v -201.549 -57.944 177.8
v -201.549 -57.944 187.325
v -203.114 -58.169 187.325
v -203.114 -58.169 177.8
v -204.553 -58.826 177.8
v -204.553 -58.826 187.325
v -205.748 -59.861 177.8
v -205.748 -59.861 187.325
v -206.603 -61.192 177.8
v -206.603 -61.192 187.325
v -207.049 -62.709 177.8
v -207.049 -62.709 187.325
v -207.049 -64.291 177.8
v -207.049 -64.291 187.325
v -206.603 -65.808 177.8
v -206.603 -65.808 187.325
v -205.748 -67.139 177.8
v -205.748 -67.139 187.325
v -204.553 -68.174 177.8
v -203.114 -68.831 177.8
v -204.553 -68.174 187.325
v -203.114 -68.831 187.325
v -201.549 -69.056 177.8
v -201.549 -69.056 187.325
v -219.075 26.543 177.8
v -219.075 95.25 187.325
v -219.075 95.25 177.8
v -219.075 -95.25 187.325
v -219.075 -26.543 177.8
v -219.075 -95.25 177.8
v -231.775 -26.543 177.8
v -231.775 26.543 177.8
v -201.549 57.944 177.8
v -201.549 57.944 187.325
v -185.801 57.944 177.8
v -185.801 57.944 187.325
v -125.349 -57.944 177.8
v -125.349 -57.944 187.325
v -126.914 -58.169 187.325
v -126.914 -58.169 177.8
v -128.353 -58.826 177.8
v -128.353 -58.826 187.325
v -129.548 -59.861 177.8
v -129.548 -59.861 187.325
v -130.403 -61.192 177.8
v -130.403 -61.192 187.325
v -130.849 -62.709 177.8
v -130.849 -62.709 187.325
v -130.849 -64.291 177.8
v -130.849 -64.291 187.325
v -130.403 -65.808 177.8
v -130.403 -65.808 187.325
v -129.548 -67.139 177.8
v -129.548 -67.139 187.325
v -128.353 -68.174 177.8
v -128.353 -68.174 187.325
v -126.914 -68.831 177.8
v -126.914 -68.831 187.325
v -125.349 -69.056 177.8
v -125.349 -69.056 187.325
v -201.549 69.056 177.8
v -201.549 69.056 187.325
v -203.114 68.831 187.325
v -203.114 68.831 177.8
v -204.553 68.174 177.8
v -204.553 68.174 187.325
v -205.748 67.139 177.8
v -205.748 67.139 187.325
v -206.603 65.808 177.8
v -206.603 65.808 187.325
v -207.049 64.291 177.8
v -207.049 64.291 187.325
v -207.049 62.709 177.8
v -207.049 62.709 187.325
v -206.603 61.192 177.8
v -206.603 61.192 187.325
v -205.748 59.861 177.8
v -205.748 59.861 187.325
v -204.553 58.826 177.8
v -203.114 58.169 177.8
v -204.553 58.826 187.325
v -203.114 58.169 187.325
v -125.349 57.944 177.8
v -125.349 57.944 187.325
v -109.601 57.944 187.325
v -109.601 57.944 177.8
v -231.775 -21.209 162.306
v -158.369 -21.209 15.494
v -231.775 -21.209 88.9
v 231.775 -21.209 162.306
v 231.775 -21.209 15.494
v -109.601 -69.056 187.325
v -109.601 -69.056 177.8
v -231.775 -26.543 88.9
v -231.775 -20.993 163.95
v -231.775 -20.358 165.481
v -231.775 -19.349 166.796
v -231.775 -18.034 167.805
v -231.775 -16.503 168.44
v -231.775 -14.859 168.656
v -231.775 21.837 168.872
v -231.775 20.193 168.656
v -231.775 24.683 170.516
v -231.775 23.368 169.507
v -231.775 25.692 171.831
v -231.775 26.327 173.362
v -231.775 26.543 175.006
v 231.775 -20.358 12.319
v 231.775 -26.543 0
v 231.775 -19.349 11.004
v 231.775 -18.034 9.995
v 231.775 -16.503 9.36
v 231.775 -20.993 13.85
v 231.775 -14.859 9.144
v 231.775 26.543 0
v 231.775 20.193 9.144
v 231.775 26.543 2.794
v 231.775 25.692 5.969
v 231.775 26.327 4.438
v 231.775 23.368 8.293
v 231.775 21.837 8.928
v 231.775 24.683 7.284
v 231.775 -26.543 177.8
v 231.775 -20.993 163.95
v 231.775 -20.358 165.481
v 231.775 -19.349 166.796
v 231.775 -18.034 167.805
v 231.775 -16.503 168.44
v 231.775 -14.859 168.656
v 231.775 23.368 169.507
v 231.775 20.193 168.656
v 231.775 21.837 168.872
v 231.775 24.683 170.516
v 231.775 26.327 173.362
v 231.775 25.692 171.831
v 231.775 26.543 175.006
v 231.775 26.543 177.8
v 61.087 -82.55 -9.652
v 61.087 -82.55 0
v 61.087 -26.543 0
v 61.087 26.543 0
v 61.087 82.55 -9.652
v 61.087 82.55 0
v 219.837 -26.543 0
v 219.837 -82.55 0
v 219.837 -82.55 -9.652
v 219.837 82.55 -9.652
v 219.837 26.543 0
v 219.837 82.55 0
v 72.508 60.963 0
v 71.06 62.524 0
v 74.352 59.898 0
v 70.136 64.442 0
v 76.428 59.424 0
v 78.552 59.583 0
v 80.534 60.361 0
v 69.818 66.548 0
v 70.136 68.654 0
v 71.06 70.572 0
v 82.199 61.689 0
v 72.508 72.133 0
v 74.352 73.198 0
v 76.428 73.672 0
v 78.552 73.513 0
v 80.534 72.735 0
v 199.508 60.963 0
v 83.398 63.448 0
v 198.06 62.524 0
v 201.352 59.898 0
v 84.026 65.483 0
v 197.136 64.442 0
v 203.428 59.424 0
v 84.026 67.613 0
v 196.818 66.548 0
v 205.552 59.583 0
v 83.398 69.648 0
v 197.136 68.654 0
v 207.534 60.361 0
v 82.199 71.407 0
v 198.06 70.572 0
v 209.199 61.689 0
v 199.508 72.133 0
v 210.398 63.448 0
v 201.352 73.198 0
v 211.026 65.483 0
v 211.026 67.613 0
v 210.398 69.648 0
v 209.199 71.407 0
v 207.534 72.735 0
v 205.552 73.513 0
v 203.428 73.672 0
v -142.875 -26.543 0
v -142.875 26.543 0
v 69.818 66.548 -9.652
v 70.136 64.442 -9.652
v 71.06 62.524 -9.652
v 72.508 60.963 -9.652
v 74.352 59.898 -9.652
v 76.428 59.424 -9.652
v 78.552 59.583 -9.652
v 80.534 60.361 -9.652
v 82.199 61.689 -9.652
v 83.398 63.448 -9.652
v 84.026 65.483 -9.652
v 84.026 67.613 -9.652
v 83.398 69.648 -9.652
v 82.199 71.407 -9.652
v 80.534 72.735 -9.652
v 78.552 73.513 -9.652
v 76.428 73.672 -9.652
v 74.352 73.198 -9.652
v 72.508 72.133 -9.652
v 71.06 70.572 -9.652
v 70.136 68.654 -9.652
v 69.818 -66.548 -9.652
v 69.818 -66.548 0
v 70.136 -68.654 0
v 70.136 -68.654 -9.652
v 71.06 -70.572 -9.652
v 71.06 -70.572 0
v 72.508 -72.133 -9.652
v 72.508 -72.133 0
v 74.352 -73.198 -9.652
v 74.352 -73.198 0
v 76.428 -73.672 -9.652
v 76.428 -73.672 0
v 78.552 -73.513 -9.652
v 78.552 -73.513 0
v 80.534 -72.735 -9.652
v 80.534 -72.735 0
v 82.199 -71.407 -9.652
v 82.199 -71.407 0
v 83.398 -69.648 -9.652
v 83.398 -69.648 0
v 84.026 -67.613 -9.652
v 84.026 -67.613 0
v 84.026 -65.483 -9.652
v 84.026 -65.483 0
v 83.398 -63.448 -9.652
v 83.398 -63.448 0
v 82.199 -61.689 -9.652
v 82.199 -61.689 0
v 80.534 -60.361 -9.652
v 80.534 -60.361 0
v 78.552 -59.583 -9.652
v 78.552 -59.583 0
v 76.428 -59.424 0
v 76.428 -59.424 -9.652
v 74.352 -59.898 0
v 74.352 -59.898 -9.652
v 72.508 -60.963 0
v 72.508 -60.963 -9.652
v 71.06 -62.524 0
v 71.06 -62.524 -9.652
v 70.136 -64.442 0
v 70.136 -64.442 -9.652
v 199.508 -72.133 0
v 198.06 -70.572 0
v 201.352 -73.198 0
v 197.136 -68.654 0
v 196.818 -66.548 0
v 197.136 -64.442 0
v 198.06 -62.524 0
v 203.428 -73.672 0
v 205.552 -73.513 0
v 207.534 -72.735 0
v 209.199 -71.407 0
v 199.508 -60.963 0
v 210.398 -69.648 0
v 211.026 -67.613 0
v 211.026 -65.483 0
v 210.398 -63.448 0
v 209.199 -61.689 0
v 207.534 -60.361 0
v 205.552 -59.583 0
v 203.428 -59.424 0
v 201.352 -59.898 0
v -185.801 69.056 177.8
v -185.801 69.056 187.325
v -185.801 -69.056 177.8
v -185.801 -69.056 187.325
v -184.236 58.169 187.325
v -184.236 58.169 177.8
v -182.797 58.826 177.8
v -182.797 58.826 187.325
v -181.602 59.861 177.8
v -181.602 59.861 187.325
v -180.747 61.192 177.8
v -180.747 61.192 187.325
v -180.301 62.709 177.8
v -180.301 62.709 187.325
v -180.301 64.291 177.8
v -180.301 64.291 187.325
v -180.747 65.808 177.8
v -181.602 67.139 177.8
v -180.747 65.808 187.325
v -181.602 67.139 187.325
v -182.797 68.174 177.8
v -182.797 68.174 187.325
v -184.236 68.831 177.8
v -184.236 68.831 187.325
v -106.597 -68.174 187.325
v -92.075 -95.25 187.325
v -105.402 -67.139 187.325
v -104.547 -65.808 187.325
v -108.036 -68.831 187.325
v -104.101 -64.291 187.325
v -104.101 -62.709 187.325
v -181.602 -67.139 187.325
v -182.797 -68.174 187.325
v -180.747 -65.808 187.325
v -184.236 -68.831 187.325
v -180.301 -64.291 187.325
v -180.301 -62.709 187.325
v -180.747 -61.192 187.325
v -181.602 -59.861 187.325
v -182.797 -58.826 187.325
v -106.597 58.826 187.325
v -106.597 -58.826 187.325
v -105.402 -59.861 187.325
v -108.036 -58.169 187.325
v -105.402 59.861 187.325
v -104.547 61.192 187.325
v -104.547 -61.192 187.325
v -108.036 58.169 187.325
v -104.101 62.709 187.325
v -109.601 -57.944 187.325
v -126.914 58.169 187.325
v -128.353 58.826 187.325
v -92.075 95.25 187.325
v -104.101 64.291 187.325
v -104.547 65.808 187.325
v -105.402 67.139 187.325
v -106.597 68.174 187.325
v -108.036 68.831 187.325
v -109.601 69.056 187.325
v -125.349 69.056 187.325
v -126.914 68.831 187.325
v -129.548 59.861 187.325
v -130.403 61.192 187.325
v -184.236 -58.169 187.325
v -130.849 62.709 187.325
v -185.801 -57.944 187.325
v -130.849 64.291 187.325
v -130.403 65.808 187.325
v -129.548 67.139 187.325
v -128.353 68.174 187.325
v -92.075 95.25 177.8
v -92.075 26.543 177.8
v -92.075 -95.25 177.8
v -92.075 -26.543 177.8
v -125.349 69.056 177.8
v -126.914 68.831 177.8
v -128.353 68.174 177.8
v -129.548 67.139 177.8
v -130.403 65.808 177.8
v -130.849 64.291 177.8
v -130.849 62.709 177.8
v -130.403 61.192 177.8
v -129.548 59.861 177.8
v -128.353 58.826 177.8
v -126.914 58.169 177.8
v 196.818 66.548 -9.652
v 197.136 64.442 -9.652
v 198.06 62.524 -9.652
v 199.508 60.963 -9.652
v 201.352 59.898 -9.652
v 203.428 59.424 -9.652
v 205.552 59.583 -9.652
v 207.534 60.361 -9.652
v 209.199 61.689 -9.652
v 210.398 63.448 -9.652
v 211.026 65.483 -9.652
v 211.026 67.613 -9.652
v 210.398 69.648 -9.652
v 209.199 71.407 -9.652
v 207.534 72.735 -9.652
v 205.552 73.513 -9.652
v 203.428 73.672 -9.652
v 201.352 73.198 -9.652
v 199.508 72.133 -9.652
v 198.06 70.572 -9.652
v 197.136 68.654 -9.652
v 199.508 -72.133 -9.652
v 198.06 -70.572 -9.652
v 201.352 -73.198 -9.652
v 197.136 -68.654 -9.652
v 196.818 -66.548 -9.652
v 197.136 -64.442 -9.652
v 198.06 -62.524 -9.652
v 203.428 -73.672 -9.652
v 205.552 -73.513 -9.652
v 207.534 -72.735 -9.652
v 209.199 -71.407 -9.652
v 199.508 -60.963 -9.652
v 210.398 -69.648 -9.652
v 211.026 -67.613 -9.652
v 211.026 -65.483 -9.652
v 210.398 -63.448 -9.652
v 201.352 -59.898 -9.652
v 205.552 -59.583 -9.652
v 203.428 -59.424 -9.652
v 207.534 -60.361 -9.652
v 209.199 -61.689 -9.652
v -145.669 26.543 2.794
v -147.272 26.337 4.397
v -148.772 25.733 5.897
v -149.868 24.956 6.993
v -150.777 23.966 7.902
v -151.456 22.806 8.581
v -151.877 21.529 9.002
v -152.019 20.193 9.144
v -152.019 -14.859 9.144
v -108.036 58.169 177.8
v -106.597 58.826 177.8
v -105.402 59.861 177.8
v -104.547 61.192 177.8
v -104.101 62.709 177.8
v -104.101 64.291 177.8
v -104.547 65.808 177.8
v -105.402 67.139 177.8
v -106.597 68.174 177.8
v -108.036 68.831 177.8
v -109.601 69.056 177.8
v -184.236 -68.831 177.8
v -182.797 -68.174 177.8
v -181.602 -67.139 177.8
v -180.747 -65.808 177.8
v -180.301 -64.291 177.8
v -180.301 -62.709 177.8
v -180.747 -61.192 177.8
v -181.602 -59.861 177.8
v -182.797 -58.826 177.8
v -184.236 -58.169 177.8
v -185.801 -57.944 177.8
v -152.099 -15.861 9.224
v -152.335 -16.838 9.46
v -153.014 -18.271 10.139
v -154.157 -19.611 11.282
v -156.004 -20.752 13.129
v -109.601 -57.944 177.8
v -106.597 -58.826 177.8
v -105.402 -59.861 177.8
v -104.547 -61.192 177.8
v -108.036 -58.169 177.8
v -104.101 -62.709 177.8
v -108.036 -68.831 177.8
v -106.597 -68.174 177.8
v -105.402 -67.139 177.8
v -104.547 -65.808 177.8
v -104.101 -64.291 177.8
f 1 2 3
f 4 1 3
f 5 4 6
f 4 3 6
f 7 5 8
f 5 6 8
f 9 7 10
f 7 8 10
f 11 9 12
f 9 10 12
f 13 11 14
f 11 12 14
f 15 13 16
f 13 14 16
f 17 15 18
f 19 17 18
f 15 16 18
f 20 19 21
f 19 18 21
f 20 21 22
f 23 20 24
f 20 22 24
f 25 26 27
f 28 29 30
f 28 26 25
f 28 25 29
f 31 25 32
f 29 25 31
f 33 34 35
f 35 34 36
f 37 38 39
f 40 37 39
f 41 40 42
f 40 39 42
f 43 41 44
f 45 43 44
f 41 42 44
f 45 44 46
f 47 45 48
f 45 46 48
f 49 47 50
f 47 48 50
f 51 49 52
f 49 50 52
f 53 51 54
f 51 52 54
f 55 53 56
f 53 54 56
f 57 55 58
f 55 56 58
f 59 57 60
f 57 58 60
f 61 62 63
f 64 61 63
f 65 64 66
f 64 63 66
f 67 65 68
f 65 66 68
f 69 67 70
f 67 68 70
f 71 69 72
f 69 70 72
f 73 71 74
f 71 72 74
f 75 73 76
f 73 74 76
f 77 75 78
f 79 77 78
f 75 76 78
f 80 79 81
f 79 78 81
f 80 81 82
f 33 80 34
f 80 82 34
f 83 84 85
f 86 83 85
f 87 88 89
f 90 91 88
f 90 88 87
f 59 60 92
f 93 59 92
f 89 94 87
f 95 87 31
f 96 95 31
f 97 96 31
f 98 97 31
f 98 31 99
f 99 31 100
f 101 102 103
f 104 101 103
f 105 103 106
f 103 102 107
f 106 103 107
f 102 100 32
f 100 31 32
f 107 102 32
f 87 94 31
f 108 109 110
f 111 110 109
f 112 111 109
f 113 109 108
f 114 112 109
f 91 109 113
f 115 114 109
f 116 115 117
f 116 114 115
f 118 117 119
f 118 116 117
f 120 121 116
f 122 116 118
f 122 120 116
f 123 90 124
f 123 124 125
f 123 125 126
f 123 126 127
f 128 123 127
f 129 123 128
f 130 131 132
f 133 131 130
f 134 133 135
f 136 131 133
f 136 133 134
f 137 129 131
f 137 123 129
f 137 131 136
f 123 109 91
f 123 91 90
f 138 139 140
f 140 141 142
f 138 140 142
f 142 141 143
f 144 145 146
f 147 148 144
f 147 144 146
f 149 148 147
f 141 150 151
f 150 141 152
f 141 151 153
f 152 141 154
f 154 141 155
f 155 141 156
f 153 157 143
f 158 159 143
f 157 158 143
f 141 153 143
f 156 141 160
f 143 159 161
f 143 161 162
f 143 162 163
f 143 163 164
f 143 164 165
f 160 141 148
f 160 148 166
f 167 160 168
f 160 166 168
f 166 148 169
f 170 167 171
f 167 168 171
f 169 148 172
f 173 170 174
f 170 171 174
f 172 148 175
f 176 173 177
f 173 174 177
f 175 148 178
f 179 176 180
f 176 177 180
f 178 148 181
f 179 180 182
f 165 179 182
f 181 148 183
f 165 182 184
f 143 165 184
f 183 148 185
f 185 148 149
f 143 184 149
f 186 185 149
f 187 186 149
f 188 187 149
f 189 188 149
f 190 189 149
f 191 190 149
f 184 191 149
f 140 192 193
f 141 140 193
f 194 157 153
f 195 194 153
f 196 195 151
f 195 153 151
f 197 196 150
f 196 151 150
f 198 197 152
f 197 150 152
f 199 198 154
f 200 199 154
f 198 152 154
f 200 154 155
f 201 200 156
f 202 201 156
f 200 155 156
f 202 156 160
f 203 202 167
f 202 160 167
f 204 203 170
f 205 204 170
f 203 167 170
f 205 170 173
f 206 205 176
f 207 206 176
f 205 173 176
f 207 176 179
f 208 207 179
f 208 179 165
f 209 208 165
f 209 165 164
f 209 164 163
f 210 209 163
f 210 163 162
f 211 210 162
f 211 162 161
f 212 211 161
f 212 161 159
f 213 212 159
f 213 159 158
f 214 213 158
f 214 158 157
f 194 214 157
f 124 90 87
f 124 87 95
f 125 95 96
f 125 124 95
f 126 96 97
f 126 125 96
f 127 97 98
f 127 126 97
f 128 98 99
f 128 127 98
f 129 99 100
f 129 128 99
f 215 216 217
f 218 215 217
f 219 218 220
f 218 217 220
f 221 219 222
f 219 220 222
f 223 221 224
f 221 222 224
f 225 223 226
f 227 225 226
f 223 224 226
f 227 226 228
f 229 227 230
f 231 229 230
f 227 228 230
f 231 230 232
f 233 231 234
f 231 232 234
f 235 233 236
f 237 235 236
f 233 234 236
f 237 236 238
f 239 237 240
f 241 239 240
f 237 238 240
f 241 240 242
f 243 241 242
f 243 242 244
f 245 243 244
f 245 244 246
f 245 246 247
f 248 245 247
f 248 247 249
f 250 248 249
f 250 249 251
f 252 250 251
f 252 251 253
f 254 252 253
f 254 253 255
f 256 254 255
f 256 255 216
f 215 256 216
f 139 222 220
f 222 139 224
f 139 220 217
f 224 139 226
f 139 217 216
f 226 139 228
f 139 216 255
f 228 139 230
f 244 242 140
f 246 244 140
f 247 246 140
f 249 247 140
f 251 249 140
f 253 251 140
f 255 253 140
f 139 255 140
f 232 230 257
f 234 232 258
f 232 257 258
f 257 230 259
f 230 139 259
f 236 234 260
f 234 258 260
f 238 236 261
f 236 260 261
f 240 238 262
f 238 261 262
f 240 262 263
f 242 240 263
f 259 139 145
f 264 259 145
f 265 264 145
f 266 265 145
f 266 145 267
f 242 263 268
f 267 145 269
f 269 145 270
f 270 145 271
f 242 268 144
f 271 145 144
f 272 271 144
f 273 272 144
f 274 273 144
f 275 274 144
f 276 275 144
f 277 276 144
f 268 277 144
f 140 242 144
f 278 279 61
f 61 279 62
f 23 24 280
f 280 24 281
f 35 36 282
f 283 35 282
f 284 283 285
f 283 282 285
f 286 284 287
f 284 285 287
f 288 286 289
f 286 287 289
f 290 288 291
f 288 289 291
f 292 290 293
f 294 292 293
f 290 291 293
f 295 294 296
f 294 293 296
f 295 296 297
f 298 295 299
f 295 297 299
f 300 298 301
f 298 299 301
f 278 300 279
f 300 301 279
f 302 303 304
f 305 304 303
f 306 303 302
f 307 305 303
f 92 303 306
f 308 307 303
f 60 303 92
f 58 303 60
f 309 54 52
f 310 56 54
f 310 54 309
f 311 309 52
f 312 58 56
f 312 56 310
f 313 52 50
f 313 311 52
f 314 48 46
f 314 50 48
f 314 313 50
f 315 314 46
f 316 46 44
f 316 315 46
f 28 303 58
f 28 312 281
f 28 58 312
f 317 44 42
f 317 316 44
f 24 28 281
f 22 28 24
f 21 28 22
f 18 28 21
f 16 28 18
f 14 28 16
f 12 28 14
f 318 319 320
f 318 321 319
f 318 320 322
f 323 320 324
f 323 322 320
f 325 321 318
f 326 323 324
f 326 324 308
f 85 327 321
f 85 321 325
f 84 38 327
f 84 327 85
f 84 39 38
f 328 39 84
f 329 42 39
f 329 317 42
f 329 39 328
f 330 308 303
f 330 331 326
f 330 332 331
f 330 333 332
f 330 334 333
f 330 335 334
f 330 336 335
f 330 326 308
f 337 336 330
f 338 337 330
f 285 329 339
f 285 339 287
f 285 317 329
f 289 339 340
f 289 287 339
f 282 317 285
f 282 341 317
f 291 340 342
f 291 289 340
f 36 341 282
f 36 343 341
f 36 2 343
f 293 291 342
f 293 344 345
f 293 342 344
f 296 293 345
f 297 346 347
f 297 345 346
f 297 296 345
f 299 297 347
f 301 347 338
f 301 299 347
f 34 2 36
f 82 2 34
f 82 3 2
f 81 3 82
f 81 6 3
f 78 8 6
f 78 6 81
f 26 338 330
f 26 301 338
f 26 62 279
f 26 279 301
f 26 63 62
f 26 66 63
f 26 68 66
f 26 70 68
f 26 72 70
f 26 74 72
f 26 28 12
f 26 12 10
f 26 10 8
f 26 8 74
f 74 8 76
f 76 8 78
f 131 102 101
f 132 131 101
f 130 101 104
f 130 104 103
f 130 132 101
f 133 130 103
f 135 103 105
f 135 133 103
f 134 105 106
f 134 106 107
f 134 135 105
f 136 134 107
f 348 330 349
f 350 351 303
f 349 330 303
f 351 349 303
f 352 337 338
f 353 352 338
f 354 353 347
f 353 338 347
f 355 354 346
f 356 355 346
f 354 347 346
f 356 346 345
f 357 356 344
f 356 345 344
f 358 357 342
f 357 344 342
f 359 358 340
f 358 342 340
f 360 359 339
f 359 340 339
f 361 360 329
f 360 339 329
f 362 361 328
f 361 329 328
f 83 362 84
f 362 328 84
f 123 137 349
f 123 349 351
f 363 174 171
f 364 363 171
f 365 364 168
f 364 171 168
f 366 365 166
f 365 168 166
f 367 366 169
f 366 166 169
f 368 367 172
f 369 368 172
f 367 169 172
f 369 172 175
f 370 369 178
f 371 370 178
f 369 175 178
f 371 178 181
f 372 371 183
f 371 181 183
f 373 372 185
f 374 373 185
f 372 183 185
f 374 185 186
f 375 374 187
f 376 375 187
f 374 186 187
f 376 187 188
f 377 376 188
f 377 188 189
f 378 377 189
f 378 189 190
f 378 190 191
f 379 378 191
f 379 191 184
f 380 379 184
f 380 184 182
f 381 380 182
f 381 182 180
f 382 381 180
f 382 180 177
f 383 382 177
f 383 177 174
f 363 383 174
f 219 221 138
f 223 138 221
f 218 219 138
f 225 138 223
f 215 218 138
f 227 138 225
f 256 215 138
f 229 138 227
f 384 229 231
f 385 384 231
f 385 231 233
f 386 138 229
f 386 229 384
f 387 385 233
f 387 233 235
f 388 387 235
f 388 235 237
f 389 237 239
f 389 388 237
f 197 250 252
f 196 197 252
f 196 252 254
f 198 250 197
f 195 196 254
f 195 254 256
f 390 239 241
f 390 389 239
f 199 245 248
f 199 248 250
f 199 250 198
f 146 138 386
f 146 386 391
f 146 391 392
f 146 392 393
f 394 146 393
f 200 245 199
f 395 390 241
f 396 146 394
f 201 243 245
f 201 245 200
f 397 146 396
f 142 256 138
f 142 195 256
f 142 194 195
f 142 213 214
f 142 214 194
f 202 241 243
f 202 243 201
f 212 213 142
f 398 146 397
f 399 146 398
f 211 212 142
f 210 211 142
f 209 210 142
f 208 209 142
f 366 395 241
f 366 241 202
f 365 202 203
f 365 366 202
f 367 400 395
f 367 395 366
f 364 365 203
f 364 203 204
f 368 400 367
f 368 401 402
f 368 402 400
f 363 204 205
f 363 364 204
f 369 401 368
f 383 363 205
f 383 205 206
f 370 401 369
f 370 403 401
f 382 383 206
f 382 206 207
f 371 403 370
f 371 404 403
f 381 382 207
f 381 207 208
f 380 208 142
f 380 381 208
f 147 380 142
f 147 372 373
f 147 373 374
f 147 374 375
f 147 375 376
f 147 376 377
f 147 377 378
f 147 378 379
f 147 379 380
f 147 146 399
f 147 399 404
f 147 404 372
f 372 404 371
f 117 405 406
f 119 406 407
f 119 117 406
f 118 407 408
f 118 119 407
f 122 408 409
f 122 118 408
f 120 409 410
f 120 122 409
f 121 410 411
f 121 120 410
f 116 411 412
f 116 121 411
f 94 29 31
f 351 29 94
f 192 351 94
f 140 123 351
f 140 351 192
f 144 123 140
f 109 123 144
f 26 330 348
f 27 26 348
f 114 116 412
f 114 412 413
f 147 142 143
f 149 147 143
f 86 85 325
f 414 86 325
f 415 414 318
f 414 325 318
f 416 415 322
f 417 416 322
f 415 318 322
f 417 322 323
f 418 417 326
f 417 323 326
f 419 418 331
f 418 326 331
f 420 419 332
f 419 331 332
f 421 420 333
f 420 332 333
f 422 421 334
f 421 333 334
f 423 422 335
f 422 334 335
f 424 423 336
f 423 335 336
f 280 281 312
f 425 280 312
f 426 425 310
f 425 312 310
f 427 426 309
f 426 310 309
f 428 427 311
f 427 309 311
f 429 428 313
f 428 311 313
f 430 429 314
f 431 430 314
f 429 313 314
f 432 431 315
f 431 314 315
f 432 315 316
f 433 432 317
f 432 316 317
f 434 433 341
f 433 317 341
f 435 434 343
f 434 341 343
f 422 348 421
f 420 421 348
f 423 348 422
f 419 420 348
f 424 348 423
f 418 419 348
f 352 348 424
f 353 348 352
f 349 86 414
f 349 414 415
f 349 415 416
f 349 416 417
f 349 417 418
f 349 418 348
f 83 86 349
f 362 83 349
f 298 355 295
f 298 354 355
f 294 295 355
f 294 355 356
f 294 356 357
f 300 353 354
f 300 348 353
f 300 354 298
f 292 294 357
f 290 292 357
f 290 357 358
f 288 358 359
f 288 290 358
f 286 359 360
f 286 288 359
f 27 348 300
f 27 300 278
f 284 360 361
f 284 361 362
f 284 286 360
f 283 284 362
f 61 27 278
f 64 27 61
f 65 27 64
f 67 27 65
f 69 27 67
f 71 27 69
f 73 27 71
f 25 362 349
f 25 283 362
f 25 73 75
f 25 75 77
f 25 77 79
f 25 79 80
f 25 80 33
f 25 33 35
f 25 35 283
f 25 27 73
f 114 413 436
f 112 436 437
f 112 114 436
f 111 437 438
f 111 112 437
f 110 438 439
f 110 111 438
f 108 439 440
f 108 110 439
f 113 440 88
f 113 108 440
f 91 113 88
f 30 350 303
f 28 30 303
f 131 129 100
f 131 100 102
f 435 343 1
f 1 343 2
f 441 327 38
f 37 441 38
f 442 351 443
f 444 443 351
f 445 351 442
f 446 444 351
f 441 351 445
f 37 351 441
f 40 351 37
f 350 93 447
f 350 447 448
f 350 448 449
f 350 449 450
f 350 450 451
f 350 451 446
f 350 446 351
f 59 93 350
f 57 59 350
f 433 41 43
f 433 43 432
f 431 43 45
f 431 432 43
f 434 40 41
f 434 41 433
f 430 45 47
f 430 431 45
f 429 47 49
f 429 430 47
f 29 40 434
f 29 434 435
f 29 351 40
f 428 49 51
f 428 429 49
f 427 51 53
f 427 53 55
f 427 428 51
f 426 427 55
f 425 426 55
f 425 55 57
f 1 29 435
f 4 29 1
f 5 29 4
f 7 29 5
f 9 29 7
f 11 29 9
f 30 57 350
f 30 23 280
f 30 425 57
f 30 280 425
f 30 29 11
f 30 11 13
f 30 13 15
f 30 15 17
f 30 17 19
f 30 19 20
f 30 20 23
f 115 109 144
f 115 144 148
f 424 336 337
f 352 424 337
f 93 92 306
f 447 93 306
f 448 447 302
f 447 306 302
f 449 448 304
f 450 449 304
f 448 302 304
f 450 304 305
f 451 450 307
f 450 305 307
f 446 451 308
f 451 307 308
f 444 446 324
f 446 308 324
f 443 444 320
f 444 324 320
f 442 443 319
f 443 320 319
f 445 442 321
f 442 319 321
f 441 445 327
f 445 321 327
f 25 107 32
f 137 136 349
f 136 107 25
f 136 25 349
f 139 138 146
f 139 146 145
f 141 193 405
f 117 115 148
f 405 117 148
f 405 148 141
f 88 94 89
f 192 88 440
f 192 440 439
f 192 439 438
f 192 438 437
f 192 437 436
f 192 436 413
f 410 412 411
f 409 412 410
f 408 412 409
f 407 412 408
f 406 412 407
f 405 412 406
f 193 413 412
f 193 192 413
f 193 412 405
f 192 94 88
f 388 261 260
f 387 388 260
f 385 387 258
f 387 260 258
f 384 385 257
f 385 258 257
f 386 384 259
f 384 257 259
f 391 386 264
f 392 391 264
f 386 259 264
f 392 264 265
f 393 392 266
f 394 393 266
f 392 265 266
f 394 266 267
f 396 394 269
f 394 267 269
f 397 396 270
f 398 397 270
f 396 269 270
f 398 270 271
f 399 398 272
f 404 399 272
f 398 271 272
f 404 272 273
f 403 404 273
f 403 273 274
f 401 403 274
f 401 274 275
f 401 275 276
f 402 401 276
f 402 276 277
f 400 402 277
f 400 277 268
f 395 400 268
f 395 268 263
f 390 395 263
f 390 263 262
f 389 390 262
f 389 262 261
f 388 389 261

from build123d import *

# Parameters (mm, degrees)
F1_DEPTH  = 231.775
F3_W      = 165.1
F3_H      = 9.652
F4_DEPTH  = 158.75
F6_D      = 14.2875
F9_DEPTH  = 63.5
F11_DEPTH = 196.978
F12_SIZE  = 88.9


with BuildPart() as f1:
    # F0 (on Right) → F1 (new body, symmetric)
    with BuildSketch(Plane.YZ):
        with BuildLine():
            Line((-26.543, 177.8), (-26.543, 0))
            Line((-26.543, 0), (0, 0))
            Line((0, 0), (0, 9.144))
            Line((0, 9.144), (-14.859, 9.144))
            ThreePointArc((-14.859, 9.144), (-19.3491280605, 11.0038719395), (-21.209, 15.494))
            Line((-21.209, 15.494), (-21.209, 162.306))
            ThreePointArc((-21.209, 162.306), (-19.3491280605, 166.7961280605), (-14.859, 168.656))
            Line((-14.859, 168.656), (0, 168.656))
            Line((0, 168.656), (0, 177.8))
            Line((0, 177.8), (-26.543, 177.8))
        make_face()
        with BuildLine():
            Line((0, 9.144), (0, 0))
            Line((0, 0), (26.543, 0))
            Line((26.543, 0), (26.543, 2.794))
            ThreePointArc((26.543, 2.794), (24.6831280605, 7.2841280605), (20.193, 9.144))
            Line((20.193, 9.144), (0, 9.144))
        make_face()
        with BuildLine():
            Line((26.543, 177.8), (0, 177.8))
            Line((0, 177.8), (0, 168.656))
            Line((0, 168.656), (20.193, 168.656))
            ThreePointArc((20.193, 168.656), (24.6831280605, 170.5158719395), (26.543, 175.006))
            Line((26.543, 175.006), (26.543, 177.8))
        make_face()
    extrude(amount=F1_DEPTH, both=True)

    # F3 (on offset) → F4 (join)
    with BuildSketch(Plane.YZ.offset(219.837)):
        with Locations((0, -4.826)):
            Rectangle(F3_W, F3_H)
    extrude(amount=-F4_DEPTH)

    # F6 (through all)
    with Locations(Plane(origin=(0, 0, -9.652), x_dir=(1, 0, 0), z_dir=(0, 0, -1))):
        with Locations((203.962, -66.548), (76.962, -66.548), (203.962, 66.548), (76.962, 66.548)):
            Hole(F6_D / 2)

    # F8 (on offset) → F9 (join, symmetric)
    with BuildSketch(Plane(origin=(-155.575, 0, 0), x_dir=(0, -1, 0), z_dir=(-1, 0, 0))):
        Polygon((-95.25, 177.8), (26.543, 177.8), (95.25, 177.8), (95.25, 187.325), (-95.25, 187.325), align=None)
    extrude(amount=F9_DEPTH, both=True)

    # F10 (on face) → F11 (cut, through all)
    with BuildSketch(Plane.XY.offset(187.325)):
        with BuildLine():
            ThreePointArc((-185.801, -69.05625), (-180.24475, -63.5), (-185.801, -57.94375))
            Line((-185.801, -57.94375), (-201.549, -57.94375))
            ThreePointArc((-201.549, -57.94375), (-207.10525, -63.5), (-201.549, -69.05625))
            Line((-201.549, -69.05625), (-185.801, -69.05625))
        make_face()
        with BuildLine():
            Line((-109.601, -57.94375), (-125.349, -57.94375))
            ThreePointArc((-125.349, -57.94375), (-130.90525, -63.5), (-125.349, -69.05625))
            Line((-125.349, -69.05625), (-109.601, -69.05625))
            ThreePointArc((-109.601, -69.05625), (-104.04475, -63.5), (-109.601, -57.94375))
        make_face()
        with BuildLine():
            Line((-185.801, 69.05625), (-201.549, 69.05625))
            ThreePointArc((-201.549, 69.05625), (-207.10525, 63.5), (-201.549, 57.94375))
            Line((-201.549, 57.94375), (-185.801, 57.94375))
            ThreePointArc((-185.801, 57.94375), (-180.24475, 63.5), (-185.801, 69.05625))
        make_face()
        with BuildLine():
            ThreePointArc((-125.349, 69.05625), (-130.90525, 63.5), (-125.349, 57.94375))
            Line((-125.349, 57.94375), (-109.601, 57.94375))
            ThreePointArc((-109.601, 57.94375), (-104.04475, 63.5), (-109.601, 69.05625))
            Line((-109.601, 69.05625), (-125.349, 69.05625))
        make_face()
    extrude(amount=-F11_DEPTH, mode=Mode.SUBTRACT)

    # F12
    f12_edges = [f1.edges().sort_by_distance(p)[0] for p in [
        (-231.775, 0, 0),
    ]]
    chamfer(f12_edges, length=F12_SIZE)


solid = f1.part
